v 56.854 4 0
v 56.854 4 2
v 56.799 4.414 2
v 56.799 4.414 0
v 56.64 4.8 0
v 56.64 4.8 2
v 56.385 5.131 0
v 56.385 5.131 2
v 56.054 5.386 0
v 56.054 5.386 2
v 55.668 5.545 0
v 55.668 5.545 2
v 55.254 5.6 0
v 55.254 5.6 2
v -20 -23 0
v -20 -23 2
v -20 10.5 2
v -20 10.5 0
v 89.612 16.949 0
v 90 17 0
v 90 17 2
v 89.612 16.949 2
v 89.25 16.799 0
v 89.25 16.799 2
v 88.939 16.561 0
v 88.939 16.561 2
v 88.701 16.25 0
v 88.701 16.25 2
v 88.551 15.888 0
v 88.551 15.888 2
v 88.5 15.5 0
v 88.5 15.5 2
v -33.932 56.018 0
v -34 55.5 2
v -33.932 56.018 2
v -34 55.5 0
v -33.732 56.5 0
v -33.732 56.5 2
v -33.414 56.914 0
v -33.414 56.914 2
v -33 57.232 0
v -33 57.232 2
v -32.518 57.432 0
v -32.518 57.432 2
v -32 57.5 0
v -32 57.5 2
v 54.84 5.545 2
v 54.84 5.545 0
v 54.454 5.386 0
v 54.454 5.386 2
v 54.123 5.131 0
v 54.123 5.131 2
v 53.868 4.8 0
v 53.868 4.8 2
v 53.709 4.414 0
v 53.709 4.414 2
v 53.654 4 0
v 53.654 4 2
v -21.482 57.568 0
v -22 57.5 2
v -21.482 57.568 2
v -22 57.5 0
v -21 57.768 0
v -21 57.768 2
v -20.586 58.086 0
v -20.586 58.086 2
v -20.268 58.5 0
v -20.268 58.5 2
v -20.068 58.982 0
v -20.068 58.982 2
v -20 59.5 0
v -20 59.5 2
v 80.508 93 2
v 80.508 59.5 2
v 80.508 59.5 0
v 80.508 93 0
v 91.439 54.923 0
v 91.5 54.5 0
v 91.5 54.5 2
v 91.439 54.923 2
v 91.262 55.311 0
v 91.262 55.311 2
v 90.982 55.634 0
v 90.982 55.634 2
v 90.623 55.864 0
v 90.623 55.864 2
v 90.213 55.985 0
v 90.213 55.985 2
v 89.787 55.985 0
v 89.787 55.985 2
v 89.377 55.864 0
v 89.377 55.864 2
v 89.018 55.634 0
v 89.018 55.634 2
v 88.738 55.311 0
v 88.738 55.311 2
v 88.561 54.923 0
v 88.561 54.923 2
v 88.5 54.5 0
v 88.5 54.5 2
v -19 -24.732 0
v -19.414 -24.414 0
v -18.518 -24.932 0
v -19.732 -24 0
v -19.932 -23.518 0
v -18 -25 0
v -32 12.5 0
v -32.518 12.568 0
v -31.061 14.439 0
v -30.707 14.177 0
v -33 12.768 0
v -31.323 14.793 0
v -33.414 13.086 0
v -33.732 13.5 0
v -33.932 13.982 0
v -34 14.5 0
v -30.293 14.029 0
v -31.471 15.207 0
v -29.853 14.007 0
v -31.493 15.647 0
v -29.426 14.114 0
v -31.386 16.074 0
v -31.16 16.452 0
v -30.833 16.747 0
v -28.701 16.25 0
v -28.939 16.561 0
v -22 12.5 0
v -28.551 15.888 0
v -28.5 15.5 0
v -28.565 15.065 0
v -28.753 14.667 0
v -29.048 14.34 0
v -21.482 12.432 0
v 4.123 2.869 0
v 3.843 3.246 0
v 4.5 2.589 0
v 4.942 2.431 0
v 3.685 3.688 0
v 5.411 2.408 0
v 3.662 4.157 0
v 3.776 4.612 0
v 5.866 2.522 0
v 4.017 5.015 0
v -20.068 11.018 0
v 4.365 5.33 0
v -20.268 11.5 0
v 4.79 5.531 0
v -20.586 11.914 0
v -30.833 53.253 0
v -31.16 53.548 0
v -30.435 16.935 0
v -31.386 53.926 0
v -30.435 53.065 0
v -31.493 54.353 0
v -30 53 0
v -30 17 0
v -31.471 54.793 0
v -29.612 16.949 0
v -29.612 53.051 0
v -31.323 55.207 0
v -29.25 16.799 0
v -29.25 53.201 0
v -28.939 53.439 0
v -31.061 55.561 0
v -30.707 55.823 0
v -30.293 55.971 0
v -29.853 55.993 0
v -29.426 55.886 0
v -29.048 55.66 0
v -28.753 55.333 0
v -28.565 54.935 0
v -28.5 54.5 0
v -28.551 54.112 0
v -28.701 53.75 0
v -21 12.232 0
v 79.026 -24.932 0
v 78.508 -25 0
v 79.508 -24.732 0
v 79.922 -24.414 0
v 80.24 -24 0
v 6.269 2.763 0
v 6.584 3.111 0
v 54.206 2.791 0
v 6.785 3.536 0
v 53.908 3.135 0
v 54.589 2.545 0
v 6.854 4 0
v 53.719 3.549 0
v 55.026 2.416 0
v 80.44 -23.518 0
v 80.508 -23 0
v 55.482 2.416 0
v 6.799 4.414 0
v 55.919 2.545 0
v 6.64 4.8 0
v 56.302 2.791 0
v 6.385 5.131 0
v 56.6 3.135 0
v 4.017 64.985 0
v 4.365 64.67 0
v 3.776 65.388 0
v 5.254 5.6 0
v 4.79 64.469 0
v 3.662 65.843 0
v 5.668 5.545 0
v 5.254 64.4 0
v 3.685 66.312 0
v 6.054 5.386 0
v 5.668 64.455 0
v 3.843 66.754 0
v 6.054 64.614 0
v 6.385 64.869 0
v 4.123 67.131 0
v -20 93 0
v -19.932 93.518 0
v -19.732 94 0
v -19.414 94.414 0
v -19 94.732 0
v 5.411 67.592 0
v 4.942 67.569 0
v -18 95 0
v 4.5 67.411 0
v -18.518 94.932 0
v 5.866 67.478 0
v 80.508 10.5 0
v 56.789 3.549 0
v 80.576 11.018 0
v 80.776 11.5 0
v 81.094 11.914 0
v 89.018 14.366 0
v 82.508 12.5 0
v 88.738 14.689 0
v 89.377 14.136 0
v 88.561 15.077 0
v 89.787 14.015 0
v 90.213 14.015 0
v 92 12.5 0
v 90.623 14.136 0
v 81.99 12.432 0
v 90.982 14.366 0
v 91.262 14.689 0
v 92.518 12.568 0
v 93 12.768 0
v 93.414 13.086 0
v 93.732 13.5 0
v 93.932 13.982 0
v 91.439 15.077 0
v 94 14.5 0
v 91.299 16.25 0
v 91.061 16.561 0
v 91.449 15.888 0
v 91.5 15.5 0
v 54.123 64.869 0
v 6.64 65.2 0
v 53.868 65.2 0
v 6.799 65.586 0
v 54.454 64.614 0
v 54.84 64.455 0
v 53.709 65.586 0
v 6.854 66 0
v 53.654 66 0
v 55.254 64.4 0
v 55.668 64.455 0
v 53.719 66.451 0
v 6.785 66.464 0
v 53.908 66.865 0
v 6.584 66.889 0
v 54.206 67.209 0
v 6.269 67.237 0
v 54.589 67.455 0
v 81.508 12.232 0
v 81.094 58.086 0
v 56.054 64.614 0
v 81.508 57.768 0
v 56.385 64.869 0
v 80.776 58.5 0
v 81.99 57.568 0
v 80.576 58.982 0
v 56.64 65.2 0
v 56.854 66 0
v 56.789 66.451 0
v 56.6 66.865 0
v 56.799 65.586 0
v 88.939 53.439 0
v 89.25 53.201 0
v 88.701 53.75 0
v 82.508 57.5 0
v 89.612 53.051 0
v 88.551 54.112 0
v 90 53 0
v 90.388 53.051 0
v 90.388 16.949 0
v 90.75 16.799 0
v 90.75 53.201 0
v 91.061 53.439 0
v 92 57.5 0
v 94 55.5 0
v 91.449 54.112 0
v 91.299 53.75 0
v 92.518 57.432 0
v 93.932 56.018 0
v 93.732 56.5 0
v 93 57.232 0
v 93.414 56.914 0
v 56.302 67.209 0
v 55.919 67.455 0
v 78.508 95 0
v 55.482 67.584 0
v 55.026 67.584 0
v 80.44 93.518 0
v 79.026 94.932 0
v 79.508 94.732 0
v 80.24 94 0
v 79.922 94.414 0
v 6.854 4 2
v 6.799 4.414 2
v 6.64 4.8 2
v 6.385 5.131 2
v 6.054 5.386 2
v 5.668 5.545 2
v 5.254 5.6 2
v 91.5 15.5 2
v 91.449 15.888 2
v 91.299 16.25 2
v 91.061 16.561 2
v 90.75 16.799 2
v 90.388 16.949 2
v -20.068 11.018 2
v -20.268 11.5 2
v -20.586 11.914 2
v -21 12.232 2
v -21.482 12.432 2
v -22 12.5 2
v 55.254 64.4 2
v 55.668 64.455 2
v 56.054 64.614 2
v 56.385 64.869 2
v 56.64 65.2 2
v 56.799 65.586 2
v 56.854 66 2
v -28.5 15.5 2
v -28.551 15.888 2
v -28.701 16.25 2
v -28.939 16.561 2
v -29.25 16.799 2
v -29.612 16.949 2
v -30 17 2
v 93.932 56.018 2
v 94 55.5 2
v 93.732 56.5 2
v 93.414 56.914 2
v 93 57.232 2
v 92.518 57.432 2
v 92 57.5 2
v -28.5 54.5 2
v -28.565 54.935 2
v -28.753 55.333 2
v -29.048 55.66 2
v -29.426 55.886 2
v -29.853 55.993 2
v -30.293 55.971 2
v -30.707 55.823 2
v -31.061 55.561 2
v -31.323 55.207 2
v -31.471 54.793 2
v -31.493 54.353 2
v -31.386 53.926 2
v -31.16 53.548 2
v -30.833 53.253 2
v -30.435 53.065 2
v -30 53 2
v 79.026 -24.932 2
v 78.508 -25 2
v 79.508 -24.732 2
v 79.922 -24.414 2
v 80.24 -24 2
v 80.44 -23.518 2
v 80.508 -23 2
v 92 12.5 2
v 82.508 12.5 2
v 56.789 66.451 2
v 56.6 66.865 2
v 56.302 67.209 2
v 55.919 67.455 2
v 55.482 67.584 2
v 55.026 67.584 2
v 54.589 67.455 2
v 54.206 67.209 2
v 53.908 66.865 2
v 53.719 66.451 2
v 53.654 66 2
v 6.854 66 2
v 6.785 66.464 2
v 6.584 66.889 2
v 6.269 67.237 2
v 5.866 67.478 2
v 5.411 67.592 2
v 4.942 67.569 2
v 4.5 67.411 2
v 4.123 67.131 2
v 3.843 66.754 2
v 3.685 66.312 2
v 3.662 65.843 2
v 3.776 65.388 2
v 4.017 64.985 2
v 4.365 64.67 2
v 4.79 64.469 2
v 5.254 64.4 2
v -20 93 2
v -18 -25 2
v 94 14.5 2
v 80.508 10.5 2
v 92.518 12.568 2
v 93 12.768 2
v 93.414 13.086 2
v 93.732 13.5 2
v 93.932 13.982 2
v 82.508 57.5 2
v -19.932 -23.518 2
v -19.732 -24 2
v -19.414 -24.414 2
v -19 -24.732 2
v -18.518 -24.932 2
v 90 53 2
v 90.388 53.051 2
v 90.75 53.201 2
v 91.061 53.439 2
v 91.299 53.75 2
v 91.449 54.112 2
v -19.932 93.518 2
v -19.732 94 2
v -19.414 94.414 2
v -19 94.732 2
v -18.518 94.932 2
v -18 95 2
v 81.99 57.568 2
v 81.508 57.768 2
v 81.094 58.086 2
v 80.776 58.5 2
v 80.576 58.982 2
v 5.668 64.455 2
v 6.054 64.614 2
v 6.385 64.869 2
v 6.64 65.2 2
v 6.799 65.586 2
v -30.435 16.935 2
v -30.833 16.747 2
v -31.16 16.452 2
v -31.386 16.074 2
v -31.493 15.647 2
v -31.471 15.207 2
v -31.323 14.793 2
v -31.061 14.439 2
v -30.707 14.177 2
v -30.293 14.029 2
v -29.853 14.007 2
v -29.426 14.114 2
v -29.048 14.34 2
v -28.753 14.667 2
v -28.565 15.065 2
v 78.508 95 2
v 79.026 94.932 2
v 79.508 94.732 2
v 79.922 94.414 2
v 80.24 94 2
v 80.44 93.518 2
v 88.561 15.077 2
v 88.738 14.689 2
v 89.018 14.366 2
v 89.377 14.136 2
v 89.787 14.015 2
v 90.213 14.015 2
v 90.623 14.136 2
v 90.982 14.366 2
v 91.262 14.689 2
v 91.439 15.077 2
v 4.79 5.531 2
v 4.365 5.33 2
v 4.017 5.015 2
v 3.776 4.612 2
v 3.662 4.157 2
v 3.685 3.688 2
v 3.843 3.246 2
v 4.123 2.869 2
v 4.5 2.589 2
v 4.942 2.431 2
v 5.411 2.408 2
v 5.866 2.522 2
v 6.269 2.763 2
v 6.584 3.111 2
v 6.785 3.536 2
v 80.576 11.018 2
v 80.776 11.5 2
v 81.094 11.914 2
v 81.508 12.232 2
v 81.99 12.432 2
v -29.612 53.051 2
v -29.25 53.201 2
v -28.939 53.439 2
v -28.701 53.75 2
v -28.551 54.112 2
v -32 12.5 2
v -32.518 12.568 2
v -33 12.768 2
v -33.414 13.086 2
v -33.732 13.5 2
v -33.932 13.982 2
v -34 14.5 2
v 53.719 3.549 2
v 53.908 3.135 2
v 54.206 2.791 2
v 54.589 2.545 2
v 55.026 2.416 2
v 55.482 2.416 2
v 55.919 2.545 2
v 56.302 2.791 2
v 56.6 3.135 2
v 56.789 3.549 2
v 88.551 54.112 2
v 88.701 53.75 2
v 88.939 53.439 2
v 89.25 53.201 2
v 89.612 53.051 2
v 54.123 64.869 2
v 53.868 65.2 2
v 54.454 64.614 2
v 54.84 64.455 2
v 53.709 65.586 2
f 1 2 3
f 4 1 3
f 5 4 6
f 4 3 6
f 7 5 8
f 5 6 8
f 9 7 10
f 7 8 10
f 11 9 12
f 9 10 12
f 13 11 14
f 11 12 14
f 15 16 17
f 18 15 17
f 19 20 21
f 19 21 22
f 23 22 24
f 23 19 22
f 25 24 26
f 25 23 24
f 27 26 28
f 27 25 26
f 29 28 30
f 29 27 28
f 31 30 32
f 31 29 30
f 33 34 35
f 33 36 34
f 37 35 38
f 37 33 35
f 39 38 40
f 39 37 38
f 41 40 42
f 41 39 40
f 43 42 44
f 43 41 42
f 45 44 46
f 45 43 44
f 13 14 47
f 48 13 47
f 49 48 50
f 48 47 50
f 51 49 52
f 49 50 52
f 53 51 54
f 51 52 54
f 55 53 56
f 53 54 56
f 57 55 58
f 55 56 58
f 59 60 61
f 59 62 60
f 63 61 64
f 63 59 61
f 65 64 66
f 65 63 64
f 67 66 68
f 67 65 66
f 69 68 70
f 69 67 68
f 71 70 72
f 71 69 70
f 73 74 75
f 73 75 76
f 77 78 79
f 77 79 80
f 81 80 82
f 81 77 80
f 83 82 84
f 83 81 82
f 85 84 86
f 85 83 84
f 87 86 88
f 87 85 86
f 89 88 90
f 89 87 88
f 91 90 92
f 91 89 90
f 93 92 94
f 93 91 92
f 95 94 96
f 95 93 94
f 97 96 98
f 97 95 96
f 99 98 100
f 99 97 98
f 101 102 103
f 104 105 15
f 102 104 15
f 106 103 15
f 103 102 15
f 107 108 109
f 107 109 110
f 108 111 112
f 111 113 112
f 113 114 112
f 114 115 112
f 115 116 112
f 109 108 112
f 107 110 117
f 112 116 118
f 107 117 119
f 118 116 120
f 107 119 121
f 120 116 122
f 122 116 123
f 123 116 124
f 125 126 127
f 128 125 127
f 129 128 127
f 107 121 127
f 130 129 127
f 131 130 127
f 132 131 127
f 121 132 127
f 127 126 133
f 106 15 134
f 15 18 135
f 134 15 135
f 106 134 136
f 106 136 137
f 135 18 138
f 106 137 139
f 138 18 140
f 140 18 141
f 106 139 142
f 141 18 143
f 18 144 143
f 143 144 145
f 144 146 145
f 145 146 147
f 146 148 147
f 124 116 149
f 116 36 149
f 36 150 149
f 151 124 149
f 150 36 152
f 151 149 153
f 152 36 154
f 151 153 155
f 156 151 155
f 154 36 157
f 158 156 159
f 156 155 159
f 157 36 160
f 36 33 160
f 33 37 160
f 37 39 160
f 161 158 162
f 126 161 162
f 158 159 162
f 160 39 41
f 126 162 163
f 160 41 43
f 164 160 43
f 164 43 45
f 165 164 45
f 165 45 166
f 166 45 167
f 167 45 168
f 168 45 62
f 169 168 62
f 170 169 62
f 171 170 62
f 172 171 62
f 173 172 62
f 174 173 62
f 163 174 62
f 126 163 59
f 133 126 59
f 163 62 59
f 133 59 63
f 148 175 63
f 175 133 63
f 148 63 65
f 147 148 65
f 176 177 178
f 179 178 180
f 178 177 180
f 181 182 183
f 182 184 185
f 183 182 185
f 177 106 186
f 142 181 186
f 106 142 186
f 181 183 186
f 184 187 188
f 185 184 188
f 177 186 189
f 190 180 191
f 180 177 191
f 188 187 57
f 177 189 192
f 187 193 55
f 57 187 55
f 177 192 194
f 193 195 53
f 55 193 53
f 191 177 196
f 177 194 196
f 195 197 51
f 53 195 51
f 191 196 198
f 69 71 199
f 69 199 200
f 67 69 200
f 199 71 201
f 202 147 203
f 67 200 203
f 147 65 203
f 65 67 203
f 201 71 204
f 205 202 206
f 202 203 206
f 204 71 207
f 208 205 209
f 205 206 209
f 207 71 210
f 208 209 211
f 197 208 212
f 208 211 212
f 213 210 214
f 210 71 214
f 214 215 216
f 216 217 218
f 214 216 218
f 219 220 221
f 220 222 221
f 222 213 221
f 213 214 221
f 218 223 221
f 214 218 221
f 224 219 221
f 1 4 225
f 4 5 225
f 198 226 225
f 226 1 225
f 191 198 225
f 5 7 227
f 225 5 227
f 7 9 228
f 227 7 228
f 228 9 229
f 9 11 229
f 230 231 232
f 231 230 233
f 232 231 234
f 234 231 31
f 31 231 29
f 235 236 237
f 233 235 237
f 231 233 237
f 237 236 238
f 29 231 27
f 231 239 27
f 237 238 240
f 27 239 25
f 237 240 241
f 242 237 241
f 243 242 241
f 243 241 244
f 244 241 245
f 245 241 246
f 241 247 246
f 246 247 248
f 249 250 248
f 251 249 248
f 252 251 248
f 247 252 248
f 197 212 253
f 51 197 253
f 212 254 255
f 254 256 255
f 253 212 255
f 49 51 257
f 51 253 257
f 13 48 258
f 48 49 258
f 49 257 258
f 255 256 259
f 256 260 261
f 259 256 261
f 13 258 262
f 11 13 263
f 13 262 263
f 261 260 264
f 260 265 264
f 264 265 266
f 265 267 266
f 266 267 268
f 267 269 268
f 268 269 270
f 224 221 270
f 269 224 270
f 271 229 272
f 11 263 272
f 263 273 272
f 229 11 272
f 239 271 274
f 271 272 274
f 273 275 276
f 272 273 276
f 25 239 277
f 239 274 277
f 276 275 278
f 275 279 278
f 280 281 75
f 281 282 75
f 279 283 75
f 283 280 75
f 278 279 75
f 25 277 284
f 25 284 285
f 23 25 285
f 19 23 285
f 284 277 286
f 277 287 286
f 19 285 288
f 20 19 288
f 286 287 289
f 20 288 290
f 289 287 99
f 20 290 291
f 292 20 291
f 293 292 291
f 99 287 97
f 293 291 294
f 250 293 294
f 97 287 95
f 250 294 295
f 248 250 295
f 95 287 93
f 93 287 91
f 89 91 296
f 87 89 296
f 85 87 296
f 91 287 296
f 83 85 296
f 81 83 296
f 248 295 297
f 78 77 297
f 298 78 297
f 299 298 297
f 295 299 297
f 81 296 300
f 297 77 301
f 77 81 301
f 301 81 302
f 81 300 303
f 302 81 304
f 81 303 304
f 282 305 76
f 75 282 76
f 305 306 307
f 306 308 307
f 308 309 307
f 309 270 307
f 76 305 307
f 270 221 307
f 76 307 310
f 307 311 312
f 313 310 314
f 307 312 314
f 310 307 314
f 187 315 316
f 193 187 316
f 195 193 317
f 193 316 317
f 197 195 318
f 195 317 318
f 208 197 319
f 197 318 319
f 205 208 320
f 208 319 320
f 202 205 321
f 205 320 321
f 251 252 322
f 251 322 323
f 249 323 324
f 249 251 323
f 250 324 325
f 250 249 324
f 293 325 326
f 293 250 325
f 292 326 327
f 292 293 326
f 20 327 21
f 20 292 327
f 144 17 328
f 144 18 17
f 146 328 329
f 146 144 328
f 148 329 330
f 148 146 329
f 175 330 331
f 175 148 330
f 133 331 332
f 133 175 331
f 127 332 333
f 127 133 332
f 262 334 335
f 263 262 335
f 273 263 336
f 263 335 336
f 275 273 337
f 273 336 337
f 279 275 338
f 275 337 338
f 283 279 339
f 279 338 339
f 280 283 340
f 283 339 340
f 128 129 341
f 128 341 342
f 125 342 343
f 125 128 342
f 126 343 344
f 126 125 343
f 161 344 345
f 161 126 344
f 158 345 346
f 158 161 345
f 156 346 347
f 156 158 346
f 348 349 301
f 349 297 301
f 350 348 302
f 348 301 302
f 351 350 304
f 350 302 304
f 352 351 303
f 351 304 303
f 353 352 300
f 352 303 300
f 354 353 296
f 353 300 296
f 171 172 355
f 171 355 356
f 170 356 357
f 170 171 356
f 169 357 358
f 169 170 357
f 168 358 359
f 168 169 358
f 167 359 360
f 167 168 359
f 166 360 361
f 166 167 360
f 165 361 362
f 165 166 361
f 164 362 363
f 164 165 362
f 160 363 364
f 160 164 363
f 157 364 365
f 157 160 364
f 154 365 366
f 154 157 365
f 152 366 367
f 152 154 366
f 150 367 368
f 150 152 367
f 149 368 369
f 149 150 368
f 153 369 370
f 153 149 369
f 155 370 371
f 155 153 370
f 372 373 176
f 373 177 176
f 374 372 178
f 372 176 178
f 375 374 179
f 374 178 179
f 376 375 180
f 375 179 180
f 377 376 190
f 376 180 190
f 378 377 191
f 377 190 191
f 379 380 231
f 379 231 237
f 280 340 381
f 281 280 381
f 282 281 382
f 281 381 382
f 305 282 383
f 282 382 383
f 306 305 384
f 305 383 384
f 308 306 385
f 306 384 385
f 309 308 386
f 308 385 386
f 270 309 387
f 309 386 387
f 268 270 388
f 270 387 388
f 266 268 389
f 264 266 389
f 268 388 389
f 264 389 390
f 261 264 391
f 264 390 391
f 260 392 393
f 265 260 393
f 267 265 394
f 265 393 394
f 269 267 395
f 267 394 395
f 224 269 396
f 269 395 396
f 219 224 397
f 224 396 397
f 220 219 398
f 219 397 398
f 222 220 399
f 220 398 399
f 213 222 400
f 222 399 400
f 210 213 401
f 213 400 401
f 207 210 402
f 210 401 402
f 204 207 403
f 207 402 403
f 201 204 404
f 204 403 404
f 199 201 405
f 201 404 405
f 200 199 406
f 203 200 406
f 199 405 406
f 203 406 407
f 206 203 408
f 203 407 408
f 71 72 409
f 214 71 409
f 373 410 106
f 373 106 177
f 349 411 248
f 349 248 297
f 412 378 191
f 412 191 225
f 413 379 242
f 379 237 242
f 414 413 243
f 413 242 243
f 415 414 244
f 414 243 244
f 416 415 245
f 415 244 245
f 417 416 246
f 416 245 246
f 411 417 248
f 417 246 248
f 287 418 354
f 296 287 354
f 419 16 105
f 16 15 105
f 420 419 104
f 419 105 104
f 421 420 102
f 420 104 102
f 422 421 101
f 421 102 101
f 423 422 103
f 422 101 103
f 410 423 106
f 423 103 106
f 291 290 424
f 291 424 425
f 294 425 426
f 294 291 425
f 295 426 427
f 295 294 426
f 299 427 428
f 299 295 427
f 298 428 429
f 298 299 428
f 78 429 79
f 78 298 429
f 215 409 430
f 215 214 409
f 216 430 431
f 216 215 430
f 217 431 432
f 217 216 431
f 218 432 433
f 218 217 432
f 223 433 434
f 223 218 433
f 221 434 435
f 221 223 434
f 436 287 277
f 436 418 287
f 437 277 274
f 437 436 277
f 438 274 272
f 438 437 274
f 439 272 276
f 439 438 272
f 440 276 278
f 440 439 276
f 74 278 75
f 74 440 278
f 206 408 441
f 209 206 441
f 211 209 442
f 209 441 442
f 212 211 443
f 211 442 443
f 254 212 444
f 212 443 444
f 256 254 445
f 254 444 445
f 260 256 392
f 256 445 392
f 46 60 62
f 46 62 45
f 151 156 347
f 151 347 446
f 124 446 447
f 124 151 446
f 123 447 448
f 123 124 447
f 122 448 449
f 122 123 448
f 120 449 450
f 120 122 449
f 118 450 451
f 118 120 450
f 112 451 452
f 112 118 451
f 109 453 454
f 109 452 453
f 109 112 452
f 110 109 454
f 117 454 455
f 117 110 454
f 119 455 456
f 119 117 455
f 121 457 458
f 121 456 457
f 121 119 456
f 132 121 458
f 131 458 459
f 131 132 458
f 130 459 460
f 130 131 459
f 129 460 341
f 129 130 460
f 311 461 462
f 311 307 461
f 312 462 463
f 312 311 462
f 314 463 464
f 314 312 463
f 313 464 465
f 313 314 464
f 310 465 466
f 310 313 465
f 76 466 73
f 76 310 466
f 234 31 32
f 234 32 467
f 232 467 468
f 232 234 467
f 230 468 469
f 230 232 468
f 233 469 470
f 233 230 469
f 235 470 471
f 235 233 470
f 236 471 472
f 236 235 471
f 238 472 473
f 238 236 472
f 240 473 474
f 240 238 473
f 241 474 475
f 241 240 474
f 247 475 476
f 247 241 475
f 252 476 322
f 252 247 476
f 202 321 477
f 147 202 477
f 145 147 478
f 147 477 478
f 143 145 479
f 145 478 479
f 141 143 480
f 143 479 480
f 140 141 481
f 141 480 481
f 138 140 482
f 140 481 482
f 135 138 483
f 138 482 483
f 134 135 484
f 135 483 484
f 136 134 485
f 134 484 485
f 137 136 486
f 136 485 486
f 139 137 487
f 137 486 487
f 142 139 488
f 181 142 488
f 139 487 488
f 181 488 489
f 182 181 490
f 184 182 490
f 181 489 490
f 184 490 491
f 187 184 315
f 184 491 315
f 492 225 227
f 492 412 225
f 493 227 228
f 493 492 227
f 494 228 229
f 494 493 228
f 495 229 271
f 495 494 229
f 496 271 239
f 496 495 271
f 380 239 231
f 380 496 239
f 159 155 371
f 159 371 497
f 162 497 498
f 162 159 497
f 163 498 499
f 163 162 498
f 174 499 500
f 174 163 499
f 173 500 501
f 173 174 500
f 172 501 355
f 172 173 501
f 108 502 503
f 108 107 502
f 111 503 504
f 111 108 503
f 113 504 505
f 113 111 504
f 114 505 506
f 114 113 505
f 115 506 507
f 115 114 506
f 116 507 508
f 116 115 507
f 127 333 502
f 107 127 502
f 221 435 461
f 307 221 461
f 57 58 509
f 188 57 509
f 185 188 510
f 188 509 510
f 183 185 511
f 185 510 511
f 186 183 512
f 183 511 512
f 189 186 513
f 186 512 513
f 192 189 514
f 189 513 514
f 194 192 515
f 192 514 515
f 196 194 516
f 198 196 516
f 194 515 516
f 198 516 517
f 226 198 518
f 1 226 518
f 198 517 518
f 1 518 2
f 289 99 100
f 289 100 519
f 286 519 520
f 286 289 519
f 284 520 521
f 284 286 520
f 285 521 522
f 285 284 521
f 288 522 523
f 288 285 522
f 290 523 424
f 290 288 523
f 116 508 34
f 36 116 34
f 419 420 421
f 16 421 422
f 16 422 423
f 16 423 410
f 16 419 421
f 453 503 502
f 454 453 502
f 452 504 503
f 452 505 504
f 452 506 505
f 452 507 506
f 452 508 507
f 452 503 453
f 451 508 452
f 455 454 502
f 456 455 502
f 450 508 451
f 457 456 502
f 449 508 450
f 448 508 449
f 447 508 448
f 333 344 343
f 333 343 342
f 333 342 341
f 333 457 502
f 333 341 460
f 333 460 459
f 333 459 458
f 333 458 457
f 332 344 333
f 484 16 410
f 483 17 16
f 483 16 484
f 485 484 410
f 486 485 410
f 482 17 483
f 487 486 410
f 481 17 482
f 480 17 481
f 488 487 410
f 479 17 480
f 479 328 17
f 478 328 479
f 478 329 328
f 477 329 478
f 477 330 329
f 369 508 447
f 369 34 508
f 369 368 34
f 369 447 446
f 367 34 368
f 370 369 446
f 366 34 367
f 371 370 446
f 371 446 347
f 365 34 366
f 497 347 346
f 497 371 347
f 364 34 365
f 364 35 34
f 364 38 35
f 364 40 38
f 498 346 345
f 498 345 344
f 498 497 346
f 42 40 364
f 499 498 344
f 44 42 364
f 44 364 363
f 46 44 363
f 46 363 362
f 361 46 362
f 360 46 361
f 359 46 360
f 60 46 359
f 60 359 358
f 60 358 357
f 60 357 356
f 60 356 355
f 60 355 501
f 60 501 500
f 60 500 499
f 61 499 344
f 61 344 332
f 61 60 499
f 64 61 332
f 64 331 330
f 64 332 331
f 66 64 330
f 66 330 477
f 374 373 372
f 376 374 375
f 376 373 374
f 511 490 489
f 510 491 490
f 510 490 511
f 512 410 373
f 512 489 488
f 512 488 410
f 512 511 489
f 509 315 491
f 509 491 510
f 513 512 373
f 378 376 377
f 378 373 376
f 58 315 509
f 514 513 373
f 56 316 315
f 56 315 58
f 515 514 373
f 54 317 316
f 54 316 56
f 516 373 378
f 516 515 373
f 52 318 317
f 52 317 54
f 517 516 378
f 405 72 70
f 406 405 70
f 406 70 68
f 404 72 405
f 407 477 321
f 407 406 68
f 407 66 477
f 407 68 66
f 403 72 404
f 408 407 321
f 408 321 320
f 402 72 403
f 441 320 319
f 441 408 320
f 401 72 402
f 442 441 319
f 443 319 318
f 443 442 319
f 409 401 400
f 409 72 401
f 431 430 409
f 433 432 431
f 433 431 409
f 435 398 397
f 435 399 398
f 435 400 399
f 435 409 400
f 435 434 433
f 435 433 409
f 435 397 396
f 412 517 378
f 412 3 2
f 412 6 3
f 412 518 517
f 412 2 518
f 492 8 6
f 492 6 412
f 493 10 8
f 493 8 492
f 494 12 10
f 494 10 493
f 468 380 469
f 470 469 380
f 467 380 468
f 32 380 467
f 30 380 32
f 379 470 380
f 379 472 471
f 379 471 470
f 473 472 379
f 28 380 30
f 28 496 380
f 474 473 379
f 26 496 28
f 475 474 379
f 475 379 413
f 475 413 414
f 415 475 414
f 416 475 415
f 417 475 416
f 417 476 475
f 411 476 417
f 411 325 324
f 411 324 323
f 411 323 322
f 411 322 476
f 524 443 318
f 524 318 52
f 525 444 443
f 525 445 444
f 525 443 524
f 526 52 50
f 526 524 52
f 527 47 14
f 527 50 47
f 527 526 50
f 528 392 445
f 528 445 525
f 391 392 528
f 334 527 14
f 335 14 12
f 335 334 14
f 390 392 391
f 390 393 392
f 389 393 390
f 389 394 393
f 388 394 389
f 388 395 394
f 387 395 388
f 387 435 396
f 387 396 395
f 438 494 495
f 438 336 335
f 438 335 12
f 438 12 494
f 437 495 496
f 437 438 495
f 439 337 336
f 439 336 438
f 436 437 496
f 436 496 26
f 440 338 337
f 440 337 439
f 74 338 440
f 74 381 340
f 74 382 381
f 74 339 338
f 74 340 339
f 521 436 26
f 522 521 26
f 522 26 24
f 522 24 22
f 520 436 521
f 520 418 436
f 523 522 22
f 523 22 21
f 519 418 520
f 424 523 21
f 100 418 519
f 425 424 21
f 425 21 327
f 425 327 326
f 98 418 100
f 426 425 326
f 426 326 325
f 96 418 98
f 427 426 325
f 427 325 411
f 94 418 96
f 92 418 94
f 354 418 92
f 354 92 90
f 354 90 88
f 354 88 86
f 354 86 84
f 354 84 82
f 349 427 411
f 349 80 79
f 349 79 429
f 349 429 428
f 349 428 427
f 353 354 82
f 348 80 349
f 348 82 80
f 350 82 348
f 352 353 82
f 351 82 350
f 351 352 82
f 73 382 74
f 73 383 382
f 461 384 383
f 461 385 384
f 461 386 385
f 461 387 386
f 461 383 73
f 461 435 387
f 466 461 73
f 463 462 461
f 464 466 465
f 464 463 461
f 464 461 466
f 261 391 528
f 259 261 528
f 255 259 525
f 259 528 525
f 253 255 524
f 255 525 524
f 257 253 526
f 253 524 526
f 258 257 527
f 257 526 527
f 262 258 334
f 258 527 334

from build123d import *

# Parameters (mm, degrees)
SKETCH_1_W               = 60
SKETCH_1_H               = 70
SKETCH_1_R               = 1.5
EXTRUDE_1_DEPTH          = 2
SKETCH_2_W               = 34
SKETCH_2_H               = 45
EXTRUDE_2_DEPTH          = 2
CUT_EXTRUDE_1_DEPTH      = 1
CUT_EXTRUDE_1_DEPTH_BACK = 118.217746097
SKETCH_3_R               = 1.5
FILLET_1_R               = 2
CUT_EXTRUDE_2_DEPTH      = 118.217746097
PATTERN_LINEAR_1_COUNT   = 4
PATTERN_LINEAR_1_PITCH   = 14
SKETCH_6_W               = 100.507986439
SKETCH_6_H               = 120
EXTRUDE_3_DEPTH          = 2
SKETCH_7_R               = 1.6
CUT_EXTRUDE_3_DEPTH      = 3
FILLET_2_R               = 2


with BuildPart() as part:
    # 草图1 → 凸台-拉伸1 (new body)
    with BuildSketch(Plane.XY):
        with Locations((30, 35)):
            Rectangle(SKETCH_1_W, SKETCH_1_H)
        with Locations((5, 66)):
            Circle(SKETCH_1_R, mode=Mode.SUBTRACT)
        with Locations((5, 4)):
            Circle(SKETCH_1_R, mode=Mode.SUBTRACT)
        with Locations((55, 4)):
            Circle(SKETCH_1_R, mode=Mode.SUBTRACT)
        with Locations((55, 66)):
            Circle(SKETCH_1_R, mode=Mode.SUBTRACT)
    extrude(amount=EXTRUDE_1_DEPTH)

    # 草图2 → 凸台-拉伸2 (add)
    with BuildSketch(Plane.XY.offset(2)):
        with Locations((77, 35)):
            Rectangle(SKETCH_2_W, SKETCH_2_H)
    extrude_2 = extrude(amount=-EXTRUDE_2_DEPTH)

    # 镜向1: 凸台-拉伸2 across plane
    add(extrude_2.mirror(Plane(origin=(30, 0, 0), x_dir=(0, 0, 1), z_dir=(1, 0, 0))))

    # 草图3 → 切除-拉伸1 (cut, two sides: drawn at the far end of the back side and taken through both)
    with BuildSketch(Plane.XY.offset(2).offset(-CUT_EXTRUDE_1_DEPTH_BACK)):
        with Locations((-30, 54.5)):
            Circle(SKETCH_3_R)
        with Locations((90, 54.5)):
            Circle(SKETCH_3_R)
        with Locations((-30, 15.5)):
            Circle(SKETCH_3_R)
        with Locations((90, 15.5)):
            Circle(SKETCH_3_R)
    extrude(amount=CUT_EXTRUDE_1_DEPTH + CUT_EXTRUDE_1_DEPTH_BACK, mode=Mode.SUBTRACT)

    # 圆角1
    fillet_1_edges = [part.edges().sort_by_distance(p)[0] for p in [
        (60, 70, 1),
        (60, 57.5, 1),
        (94, 57.5, 1),
        (94, 12.5, 1),
        (60, 12.5, 1),
        (60, 0, 1),
        (0, 0, 1),
        (0, 12.5, 1),
        (-34, 12.5, 1),
        (0, 70, 1),
        (0, 57.5, 1),
        (-34, 57.5, 1),
    ]]
    fillet(fillet_1_edges, radius=FILLET_1_R)

    # 草图4 → 切除-拉伸2 (cut, through all)
    with BuildSketch(Plane.XY.offset(2)):
        with BuildLine():
            Line((15, 55), (15, 15))
            ThreePointArc((15, 15), (11, 11), (7, 15))
            Line((7, 15), (7, 55))
            ThreePointArc((7, 55), (11, 59), (15, 55))
        make_face()
    cut_extrude_2 = extrude(amount=-CUT_EXTRUDE_2_DEPTH, mode=Mode.SUBTRACT)

    # 阵列(线性)1: 切除-拉伸2 ×4
    with Locations(*[(i * PATTERN_LINEAR_1_PITCH, 0, 0) for i in range(1, PATTERN_LINEAR_1_COUNT)]):
        add(cut_extrude_2, mode=Mode.SUBTRACT)

    # 草图6 → 凸台-拉伸3 (add)
    with BuildSketch(Plane.XY.offset(2)):
        with Locations((30.25399322, 35)):
            Rectangle(SKETCH_6_W, SKETCH_6_H)
    extrude(amount=-EXTRUDE_3_DEPTH)

    # 草图7 → 切除-拉伸3 (cut)
    with BuildSketch(Plane.XY.offset(2)):
        with Locations((5.25399322, 4)):
            Circle(SKETCH_7_R)
        with Locations((55.25399322, 4)):
            Circle(SKETCH_7_R)
        with Locations((5.25399322, 66)):
            Circle(SKETCH_7_R)
        with Locations((55.25399322, 66)):
            Circle(SKETCH_7_R)
    extrude(amount=-CUT_EXTRUDE_3_DEPTH, mode=Mode.SUBTRACT)

    # 圆角2
    fillet_2_edges = [part.edges().sort_by_distance(p)[0] for p in [
        (-20, 57.5, 1),
        (-20, 95, 1),
        (80.507986439, 95, 1),
        (80.507986439, 57.5, 1),
        (80.507986439, 12.5, 1),
        (80.507986439, -25, 1),
        (-20, -25, 1),
        (-20, 12.5, 1),
    ]]
    fillet(fillet_2_edges, radius=FILLET_2_R)


solid = part.part
